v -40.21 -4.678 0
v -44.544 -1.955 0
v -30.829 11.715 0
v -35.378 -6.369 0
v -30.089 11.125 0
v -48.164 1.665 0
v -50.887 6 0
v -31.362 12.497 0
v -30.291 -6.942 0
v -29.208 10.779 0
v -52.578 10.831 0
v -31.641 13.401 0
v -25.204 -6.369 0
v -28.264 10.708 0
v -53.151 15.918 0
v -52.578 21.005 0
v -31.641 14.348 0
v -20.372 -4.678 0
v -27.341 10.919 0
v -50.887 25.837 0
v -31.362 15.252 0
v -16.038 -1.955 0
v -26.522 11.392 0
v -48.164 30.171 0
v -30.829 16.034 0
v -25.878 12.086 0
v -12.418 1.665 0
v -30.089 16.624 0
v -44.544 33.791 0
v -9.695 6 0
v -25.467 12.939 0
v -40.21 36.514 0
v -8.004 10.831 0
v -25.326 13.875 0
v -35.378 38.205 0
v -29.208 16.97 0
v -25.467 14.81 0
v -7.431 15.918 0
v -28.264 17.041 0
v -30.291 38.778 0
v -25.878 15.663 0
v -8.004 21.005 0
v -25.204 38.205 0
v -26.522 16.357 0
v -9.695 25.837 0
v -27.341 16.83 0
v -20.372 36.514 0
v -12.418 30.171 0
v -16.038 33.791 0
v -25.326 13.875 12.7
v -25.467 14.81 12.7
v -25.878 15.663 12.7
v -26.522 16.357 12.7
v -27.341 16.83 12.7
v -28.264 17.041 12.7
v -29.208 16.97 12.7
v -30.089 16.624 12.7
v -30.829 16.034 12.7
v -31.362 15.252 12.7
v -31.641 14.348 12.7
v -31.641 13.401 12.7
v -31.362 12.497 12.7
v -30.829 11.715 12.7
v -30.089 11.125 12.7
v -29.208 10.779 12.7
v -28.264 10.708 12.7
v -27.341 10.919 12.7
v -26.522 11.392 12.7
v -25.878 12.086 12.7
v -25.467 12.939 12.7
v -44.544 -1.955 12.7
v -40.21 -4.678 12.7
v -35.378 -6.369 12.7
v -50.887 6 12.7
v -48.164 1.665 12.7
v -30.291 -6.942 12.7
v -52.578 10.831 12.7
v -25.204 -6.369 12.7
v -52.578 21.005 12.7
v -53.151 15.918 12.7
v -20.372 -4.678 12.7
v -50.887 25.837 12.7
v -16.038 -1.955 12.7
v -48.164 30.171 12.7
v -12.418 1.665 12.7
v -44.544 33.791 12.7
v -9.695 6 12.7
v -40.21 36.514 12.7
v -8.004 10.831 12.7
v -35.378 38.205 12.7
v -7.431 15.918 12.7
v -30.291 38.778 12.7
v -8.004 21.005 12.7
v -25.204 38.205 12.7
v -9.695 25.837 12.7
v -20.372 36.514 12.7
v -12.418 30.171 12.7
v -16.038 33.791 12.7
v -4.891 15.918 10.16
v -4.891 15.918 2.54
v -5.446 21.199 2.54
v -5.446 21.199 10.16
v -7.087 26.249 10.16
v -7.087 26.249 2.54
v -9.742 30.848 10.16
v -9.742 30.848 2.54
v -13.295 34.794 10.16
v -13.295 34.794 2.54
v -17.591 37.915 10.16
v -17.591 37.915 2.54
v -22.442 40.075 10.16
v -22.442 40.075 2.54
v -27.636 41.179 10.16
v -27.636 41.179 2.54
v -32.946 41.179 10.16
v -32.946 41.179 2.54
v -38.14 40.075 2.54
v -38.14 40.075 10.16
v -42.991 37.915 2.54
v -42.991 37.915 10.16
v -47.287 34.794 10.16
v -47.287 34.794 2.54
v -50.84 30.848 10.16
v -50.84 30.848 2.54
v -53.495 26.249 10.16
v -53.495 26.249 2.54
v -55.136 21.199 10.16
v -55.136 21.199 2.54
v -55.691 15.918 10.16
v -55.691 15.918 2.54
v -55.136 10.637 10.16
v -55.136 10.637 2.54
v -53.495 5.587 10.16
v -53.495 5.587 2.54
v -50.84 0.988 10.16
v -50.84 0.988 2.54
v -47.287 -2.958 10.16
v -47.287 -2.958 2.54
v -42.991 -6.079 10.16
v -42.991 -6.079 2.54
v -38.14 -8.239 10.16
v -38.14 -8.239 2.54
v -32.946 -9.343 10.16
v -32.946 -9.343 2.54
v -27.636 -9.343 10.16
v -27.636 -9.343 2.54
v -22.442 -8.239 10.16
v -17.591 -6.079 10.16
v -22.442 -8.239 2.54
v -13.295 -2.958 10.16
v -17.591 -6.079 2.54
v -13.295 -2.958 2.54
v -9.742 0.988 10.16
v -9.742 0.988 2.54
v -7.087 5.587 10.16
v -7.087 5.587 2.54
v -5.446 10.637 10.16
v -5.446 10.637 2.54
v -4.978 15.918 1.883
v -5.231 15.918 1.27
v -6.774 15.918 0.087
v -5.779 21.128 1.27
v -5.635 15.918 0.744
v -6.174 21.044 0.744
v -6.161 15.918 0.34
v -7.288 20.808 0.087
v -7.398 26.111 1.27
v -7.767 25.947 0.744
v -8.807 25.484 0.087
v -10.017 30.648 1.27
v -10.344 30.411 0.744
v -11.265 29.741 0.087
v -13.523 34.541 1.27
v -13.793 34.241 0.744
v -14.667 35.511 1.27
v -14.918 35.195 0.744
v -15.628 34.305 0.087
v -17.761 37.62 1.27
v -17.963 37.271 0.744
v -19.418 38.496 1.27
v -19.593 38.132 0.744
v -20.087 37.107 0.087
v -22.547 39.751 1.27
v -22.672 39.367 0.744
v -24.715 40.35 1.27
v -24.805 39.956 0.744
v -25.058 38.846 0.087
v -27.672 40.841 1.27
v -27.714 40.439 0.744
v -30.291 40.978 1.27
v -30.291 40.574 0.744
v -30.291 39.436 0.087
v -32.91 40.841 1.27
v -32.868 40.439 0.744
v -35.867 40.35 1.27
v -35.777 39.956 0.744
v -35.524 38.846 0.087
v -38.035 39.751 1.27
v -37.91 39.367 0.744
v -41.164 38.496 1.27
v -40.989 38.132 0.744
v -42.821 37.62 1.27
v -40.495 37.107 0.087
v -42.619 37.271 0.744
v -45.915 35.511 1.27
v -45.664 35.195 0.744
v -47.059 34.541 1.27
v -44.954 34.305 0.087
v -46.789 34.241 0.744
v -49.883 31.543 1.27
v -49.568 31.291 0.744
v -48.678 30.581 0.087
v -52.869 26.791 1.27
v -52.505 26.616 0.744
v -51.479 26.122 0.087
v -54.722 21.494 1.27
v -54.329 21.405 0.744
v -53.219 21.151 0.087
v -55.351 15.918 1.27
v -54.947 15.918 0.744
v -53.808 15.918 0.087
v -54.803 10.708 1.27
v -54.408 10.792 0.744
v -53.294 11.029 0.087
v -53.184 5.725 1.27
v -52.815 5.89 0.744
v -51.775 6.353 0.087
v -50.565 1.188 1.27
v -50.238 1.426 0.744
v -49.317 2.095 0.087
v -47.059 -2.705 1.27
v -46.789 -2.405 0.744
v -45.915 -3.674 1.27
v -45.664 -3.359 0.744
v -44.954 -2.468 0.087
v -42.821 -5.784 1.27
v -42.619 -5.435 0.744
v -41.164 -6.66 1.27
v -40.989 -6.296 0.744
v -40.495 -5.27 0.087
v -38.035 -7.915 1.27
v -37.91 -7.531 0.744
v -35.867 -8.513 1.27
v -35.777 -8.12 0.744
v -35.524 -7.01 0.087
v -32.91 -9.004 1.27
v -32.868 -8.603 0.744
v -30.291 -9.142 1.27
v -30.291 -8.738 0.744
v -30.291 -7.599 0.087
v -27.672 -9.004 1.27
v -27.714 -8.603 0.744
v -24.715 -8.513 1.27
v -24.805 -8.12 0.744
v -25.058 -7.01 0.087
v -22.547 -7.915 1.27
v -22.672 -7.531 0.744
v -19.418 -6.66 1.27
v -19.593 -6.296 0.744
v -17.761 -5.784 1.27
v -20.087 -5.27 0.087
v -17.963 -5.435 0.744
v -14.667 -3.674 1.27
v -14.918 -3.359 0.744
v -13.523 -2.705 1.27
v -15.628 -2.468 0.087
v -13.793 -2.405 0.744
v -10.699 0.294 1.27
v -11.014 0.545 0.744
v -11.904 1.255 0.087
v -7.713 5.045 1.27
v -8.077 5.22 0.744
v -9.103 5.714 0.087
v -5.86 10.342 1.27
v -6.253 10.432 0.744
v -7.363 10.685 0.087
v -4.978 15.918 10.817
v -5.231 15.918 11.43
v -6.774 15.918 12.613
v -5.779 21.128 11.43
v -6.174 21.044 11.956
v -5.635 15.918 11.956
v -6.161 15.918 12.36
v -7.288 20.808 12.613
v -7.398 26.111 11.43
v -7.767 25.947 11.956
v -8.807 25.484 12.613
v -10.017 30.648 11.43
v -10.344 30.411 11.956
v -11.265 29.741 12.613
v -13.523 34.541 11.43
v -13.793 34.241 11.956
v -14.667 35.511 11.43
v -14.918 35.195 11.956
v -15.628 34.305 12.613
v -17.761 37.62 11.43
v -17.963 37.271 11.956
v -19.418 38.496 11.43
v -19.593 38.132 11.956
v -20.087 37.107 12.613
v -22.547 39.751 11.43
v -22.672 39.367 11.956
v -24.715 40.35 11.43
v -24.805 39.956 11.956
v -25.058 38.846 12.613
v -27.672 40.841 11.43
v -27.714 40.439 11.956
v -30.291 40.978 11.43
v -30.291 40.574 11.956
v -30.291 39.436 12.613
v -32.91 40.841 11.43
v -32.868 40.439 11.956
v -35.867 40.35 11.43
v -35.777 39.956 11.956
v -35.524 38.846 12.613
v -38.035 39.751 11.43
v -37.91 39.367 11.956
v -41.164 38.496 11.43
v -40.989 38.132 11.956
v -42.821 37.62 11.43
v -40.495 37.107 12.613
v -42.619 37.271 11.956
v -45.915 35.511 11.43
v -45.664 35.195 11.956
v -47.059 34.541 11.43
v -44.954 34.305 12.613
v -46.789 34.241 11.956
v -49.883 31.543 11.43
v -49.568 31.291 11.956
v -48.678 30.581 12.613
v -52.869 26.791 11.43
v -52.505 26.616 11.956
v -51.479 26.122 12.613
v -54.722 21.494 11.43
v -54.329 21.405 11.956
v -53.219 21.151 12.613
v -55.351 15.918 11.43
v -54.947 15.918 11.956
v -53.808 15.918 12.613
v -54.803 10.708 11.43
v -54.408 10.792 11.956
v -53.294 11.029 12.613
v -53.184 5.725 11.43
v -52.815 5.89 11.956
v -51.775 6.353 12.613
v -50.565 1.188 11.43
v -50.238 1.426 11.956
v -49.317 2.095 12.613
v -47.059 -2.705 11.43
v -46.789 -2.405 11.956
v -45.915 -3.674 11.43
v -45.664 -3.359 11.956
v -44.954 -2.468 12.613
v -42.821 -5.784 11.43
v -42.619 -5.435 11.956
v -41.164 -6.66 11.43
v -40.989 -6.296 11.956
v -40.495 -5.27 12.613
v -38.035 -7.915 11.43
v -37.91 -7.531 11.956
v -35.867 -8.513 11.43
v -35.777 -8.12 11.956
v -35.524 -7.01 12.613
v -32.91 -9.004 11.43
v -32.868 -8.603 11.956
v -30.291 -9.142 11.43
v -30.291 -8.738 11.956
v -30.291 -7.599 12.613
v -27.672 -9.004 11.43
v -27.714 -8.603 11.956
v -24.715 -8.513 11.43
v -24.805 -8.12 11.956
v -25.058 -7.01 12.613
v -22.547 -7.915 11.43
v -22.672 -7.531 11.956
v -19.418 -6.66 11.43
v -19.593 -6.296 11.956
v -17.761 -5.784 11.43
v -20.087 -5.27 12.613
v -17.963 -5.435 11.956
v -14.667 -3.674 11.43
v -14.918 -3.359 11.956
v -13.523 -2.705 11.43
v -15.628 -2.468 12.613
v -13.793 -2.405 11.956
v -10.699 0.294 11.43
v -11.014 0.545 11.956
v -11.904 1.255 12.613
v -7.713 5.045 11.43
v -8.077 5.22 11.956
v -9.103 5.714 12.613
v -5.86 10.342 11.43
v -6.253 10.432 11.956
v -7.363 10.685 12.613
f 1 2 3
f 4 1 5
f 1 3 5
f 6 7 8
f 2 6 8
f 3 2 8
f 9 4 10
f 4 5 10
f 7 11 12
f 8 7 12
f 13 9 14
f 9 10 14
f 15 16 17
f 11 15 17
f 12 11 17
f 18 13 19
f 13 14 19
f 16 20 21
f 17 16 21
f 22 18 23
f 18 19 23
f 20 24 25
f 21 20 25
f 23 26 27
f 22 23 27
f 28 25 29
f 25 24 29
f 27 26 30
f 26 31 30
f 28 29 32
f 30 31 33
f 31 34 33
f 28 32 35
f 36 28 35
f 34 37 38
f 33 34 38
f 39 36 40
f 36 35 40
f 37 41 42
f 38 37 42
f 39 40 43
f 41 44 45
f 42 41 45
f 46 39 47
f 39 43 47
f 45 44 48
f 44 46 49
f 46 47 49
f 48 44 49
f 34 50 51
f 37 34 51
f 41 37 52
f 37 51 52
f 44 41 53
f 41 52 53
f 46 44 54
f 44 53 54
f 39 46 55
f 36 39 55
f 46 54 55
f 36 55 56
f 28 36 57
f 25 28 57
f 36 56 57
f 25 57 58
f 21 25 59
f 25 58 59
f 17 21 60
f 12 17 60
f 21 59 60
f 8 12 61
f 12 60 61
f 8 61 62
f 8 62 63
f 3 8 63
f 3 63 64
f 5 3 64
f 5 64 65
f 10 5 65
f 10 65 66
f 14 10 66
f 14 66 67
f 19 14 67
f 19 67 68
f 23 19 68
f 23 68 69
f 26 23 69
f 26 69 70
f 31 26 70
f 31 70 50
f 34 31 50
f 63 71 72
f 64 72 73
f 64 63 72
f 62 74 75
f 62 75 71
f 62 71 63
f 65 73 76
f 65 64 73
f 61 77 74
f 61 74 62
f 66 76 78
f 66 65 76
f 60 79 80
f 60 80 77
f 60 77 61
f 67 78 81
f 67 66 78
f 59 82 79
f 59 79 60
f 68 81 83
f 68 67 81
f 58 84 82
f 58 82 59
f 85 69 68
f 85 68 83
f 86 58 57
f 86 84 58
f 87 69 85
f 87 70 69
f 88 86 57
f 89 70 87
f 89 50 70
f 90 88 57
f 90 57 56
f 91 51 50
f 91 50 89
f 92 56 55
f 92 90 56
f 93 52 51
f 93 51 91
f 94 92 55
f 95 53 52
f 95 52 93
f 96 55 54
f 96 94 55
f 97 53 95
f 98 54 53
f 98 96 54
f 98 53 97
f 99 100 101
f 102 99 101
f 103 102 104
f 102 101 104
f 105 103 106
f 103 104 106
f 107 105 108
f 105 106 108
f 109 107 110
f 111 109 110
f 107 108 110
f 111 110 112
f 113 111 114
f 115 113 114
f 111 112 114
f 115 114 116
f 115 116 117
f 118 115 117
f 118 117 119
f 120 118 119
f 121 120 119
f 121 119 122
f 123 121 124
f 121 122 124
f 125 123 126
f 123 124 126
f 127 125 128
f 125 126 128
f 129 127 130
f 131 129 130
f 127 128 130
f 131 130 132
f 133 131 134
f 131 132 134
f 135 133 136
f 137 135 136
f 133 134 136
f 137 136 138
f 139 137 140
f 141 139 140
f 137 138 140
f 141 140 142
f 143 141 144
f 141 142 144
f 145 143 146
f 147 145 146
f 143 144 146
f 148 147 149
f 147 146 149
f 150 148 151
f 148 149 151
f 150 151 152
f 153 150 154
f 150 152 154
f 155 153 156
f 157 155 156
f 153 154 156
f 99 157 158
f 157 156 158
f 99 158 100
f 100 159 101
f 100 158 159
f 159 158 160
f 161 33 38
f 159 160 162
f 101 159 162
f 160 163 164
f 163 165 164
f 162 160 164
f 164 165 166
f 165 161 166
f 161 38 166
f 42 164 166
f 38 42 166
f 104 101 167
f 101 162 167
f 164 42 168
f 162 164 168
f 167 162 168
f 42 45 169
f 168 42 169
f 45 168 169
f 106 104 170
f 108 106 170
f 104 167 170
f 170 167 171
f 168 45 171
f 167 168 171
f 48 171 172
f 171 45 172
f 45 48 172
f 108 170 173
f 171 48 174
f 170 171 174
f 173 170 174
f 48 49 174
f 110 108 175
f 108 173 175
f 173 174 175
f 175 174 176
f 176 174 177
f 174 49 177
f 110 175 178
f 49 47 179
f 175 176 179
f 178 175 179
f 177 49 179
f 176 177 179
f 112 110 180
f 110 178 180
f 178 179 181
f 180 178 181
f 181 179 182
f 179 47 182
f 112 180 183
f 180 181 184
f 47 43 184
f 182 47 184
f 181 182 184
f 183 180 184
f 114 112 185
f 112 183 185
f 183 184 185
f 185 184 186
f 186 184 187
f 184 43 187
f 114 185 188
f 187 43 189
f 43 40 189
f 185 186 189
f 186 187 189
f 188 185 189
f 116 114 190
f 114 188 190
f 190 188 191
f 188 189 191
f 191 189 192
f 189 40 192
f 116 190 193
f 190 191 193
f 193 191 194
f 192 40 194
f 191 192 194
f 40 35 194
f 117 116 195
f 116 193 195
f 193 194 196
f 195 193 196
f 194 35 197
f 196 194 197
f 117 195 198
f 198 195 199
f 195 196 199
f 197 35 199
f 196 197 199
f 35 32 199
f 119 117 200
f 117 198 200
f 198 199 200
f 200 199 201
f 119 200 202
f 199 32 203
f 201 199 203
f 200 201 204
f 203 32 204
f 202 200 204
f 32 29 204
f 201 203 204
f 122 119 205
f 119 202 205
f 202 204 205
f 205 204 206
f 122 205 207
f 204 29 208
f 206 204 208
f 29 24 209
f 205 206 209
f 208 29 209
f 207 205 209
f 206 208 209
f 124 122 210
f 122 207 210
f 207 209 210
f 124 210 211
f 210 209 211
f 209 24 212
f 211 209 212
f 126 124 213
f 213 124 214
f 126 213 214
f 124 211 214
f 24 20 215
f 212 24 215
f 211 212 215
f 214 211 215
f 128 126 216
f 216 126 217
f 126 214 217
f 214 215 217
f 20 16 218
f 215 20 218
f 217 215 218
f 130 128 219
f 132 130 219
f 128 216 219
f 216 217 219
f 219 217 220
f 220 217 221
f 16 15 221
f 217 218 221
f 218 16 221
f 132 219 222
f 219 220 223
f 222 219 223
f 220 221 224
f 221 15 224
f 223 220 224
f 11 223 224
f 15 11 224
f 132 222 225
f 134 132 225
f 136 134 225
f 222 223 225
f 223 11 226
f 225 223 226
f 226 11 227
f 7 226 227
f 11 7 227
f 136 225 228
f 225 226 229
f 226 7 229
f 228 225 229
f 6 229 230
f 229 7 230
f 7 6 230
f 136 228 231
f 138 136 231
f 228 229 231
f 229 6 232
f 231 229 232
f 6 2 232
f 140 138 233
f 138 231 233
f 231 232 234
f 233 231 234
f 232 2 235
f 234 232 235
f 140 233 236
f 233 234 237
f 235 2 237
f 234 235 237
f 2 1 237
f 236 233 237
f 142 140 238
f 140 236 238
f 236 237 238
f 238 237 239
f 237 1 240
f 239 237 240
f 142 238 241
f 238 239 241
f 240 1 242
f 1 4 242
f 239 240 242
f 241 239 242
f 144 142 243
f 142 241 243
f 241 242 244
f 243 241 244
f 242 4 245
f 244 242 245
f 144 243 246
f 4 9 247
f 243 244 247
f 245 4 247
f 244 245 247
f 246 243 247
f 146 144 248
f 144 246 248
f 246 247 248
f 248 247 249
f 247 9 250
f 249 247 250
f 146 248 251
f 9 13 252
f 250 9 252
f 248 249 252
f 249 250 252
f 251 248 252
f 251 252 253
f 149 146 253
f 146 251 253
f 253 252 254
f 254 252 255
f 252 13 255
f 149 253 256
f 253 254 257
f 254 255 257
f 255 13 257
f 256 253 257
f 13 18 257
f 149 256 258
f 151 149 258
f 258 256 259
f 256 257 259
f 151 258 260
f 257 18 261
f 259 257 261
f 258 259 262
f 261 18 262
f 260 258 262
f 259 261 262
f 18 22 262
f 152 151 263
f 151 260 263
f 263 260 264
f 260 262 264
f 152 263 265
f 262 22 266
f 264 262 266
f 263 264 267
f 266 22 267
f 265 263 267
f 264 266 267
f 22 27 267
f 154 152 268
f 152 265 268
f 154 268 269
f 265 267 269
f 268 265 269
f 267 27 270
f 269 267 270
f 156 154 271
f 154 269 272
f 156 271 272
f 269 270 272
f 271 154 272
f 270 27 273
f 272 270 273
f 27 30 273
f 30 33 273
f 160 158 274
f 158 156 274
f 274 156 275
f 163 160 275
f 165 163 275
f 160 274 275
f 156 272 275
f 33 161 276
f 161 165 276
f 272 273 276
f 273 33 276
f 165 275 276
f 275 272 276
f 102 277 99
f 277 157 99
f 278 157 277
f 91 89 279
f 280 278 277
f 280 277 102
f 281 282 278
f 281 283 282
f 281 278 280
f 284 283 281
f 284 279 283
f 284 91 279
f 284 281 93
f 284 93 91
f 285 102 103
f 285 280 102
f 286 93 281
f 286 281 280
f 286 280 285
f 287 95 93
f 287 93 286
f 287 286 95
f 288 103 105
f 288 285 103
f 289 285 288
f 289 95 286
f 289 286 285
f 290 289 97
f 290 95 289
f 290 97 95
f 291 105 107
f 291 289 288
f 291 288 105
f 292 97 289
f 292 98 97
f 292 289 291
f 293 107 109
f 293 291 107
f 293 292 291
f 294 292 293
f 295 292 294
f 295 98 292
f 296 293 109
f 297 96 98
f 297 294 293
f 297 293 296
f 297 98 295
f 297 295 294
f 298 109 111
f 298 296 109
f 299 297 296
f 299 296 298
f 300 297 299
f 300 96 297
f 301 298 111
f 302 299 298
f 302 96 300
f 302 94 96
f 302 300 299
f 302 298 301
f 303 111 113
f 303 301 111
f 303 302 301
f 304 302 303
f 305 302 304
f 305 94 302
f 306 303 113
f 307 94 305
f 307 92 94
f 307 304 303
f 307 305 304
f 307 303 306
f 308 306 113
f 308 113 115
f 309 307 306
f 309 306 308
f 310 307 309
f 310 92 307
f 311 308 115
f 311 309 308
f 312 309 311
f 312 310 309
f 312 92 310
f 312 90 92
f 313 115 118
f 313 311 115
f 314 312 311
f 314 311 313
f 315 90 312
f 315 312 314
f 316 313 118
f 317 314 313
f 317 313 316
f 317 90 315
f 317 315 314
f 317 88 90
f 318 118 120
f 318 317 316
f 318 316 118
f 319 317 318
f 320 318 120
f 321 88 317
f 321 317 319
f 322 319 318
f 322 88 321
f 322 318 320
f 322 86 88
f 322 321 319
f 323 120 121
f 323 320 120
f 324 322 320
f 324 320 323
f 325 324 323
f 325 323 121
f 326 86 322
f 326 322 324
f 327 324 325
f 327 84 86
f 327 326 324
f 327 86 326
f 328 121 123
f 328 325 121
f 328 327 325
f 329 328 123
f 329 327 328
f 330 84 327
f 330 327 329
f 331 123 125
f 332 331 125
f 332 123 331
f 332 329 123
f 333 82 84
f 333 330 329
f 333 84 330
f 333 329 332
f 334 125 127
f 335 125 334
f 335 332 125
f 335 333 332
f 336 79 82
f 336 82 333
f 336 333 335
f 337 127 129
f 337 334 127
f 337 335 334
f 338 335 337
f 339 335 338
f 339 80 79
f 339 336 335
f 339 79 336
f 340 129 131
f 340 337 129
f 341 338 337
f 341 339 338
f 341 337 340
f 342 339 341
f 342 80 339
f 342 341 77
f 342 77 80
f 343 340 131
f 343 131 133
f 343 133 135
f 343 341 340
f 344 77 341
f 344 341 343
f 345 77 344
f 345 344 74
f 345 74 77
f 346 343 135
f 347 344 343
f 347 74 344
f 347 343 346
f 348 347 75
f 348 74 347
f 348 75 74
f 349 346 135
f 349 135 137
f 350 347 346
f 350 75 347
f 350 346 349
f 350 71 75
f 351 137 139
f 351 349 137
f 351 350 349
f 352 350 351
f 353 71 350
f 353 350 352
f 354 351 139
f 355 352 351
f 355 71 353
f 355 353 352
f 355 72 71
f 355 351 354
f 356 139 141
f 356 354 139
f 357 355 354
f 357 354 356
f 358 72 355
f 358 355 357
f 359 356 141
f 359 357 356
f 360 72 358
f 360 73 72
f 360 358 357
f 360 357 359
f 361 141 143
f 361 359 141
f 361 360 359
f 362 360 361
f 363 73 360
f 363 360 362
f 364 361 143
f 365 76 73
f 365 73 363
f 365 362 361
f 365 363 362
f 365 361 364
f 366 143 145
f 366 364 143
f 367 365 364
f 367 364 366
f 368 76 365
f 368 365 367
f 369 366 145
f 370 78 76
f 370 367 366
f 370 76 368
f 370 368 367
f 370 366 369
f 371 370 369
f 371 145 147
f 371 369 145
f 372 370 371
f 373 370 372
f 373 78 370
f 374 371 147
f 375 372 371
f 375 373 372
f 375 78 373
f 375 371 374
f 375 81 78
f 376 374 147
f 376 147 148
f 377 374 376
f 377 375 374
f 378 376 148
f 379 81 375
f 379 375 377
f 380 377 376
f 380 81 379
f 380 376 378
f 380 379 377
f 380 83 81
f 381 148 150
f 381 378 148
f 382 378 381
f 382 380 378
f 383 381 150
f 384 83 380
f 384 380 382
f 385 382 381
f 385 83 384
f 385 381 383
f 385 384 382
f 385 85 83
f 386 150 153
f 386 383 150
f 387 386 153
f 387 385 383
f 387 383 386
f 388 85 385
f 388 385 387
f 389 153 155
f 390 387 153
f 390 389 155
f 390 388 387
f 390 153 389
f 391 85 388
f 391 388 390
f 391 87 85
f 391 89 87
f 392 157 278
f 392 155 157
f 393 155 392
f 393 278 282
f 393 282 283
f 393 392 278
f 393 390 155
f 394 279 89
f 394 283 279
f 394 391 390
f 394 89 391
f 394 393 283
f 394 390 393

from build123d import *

# Parameters (mm, degrees)
SKETCH1_R                   = 25.4
BOSS_EXTRUDE1_DEPTH         = 12.7
FILLET1_R                   = 2.54
FILLET2_R                   = 2.54
F_1_4_0_25_DIAMETER_HOLE1_D = 6.35


with BuildPart() as part:
    # Sketch1 → Boss-Extrude1 (new body)
    with BuildSketch(Plane.XY):
        with Locations((-30.291010944, 15.918155424)):
            Circle(SKETCH1_R)
    extrude(amount=BOSS_EXTRUDE1_DEPTH)

    # Fillet1
    fillet1_edges = [part.edges().sort_by_distance(p)[0] for p in [
        (-55.691010944, 15.918155424, 12.7),
    ]]
    fillet(fillet1_edges, radius=FILLET1_R)

    # Fillet2
    fillet2_edges = [part.edges().sort_by_distance(p)[0] for p in [
        (-55.691010944, 15.918155424, 0),
    ]]
    fillet(fillet2_edges, radius=FILLET2_R)

    # 1/4 (0.25) Diameter Hole1 (through all)
    with Locations(Plane(origin=(0, 0, 0), x_dir=(-1, 0, 0), z_dir=(0, 0, -1))):
        with Locations((28.50138728, 13.874510617)):
            Hole(F_1_4_0_25_DIAMETER_HOLE1_D / 2)


solid = part.part
